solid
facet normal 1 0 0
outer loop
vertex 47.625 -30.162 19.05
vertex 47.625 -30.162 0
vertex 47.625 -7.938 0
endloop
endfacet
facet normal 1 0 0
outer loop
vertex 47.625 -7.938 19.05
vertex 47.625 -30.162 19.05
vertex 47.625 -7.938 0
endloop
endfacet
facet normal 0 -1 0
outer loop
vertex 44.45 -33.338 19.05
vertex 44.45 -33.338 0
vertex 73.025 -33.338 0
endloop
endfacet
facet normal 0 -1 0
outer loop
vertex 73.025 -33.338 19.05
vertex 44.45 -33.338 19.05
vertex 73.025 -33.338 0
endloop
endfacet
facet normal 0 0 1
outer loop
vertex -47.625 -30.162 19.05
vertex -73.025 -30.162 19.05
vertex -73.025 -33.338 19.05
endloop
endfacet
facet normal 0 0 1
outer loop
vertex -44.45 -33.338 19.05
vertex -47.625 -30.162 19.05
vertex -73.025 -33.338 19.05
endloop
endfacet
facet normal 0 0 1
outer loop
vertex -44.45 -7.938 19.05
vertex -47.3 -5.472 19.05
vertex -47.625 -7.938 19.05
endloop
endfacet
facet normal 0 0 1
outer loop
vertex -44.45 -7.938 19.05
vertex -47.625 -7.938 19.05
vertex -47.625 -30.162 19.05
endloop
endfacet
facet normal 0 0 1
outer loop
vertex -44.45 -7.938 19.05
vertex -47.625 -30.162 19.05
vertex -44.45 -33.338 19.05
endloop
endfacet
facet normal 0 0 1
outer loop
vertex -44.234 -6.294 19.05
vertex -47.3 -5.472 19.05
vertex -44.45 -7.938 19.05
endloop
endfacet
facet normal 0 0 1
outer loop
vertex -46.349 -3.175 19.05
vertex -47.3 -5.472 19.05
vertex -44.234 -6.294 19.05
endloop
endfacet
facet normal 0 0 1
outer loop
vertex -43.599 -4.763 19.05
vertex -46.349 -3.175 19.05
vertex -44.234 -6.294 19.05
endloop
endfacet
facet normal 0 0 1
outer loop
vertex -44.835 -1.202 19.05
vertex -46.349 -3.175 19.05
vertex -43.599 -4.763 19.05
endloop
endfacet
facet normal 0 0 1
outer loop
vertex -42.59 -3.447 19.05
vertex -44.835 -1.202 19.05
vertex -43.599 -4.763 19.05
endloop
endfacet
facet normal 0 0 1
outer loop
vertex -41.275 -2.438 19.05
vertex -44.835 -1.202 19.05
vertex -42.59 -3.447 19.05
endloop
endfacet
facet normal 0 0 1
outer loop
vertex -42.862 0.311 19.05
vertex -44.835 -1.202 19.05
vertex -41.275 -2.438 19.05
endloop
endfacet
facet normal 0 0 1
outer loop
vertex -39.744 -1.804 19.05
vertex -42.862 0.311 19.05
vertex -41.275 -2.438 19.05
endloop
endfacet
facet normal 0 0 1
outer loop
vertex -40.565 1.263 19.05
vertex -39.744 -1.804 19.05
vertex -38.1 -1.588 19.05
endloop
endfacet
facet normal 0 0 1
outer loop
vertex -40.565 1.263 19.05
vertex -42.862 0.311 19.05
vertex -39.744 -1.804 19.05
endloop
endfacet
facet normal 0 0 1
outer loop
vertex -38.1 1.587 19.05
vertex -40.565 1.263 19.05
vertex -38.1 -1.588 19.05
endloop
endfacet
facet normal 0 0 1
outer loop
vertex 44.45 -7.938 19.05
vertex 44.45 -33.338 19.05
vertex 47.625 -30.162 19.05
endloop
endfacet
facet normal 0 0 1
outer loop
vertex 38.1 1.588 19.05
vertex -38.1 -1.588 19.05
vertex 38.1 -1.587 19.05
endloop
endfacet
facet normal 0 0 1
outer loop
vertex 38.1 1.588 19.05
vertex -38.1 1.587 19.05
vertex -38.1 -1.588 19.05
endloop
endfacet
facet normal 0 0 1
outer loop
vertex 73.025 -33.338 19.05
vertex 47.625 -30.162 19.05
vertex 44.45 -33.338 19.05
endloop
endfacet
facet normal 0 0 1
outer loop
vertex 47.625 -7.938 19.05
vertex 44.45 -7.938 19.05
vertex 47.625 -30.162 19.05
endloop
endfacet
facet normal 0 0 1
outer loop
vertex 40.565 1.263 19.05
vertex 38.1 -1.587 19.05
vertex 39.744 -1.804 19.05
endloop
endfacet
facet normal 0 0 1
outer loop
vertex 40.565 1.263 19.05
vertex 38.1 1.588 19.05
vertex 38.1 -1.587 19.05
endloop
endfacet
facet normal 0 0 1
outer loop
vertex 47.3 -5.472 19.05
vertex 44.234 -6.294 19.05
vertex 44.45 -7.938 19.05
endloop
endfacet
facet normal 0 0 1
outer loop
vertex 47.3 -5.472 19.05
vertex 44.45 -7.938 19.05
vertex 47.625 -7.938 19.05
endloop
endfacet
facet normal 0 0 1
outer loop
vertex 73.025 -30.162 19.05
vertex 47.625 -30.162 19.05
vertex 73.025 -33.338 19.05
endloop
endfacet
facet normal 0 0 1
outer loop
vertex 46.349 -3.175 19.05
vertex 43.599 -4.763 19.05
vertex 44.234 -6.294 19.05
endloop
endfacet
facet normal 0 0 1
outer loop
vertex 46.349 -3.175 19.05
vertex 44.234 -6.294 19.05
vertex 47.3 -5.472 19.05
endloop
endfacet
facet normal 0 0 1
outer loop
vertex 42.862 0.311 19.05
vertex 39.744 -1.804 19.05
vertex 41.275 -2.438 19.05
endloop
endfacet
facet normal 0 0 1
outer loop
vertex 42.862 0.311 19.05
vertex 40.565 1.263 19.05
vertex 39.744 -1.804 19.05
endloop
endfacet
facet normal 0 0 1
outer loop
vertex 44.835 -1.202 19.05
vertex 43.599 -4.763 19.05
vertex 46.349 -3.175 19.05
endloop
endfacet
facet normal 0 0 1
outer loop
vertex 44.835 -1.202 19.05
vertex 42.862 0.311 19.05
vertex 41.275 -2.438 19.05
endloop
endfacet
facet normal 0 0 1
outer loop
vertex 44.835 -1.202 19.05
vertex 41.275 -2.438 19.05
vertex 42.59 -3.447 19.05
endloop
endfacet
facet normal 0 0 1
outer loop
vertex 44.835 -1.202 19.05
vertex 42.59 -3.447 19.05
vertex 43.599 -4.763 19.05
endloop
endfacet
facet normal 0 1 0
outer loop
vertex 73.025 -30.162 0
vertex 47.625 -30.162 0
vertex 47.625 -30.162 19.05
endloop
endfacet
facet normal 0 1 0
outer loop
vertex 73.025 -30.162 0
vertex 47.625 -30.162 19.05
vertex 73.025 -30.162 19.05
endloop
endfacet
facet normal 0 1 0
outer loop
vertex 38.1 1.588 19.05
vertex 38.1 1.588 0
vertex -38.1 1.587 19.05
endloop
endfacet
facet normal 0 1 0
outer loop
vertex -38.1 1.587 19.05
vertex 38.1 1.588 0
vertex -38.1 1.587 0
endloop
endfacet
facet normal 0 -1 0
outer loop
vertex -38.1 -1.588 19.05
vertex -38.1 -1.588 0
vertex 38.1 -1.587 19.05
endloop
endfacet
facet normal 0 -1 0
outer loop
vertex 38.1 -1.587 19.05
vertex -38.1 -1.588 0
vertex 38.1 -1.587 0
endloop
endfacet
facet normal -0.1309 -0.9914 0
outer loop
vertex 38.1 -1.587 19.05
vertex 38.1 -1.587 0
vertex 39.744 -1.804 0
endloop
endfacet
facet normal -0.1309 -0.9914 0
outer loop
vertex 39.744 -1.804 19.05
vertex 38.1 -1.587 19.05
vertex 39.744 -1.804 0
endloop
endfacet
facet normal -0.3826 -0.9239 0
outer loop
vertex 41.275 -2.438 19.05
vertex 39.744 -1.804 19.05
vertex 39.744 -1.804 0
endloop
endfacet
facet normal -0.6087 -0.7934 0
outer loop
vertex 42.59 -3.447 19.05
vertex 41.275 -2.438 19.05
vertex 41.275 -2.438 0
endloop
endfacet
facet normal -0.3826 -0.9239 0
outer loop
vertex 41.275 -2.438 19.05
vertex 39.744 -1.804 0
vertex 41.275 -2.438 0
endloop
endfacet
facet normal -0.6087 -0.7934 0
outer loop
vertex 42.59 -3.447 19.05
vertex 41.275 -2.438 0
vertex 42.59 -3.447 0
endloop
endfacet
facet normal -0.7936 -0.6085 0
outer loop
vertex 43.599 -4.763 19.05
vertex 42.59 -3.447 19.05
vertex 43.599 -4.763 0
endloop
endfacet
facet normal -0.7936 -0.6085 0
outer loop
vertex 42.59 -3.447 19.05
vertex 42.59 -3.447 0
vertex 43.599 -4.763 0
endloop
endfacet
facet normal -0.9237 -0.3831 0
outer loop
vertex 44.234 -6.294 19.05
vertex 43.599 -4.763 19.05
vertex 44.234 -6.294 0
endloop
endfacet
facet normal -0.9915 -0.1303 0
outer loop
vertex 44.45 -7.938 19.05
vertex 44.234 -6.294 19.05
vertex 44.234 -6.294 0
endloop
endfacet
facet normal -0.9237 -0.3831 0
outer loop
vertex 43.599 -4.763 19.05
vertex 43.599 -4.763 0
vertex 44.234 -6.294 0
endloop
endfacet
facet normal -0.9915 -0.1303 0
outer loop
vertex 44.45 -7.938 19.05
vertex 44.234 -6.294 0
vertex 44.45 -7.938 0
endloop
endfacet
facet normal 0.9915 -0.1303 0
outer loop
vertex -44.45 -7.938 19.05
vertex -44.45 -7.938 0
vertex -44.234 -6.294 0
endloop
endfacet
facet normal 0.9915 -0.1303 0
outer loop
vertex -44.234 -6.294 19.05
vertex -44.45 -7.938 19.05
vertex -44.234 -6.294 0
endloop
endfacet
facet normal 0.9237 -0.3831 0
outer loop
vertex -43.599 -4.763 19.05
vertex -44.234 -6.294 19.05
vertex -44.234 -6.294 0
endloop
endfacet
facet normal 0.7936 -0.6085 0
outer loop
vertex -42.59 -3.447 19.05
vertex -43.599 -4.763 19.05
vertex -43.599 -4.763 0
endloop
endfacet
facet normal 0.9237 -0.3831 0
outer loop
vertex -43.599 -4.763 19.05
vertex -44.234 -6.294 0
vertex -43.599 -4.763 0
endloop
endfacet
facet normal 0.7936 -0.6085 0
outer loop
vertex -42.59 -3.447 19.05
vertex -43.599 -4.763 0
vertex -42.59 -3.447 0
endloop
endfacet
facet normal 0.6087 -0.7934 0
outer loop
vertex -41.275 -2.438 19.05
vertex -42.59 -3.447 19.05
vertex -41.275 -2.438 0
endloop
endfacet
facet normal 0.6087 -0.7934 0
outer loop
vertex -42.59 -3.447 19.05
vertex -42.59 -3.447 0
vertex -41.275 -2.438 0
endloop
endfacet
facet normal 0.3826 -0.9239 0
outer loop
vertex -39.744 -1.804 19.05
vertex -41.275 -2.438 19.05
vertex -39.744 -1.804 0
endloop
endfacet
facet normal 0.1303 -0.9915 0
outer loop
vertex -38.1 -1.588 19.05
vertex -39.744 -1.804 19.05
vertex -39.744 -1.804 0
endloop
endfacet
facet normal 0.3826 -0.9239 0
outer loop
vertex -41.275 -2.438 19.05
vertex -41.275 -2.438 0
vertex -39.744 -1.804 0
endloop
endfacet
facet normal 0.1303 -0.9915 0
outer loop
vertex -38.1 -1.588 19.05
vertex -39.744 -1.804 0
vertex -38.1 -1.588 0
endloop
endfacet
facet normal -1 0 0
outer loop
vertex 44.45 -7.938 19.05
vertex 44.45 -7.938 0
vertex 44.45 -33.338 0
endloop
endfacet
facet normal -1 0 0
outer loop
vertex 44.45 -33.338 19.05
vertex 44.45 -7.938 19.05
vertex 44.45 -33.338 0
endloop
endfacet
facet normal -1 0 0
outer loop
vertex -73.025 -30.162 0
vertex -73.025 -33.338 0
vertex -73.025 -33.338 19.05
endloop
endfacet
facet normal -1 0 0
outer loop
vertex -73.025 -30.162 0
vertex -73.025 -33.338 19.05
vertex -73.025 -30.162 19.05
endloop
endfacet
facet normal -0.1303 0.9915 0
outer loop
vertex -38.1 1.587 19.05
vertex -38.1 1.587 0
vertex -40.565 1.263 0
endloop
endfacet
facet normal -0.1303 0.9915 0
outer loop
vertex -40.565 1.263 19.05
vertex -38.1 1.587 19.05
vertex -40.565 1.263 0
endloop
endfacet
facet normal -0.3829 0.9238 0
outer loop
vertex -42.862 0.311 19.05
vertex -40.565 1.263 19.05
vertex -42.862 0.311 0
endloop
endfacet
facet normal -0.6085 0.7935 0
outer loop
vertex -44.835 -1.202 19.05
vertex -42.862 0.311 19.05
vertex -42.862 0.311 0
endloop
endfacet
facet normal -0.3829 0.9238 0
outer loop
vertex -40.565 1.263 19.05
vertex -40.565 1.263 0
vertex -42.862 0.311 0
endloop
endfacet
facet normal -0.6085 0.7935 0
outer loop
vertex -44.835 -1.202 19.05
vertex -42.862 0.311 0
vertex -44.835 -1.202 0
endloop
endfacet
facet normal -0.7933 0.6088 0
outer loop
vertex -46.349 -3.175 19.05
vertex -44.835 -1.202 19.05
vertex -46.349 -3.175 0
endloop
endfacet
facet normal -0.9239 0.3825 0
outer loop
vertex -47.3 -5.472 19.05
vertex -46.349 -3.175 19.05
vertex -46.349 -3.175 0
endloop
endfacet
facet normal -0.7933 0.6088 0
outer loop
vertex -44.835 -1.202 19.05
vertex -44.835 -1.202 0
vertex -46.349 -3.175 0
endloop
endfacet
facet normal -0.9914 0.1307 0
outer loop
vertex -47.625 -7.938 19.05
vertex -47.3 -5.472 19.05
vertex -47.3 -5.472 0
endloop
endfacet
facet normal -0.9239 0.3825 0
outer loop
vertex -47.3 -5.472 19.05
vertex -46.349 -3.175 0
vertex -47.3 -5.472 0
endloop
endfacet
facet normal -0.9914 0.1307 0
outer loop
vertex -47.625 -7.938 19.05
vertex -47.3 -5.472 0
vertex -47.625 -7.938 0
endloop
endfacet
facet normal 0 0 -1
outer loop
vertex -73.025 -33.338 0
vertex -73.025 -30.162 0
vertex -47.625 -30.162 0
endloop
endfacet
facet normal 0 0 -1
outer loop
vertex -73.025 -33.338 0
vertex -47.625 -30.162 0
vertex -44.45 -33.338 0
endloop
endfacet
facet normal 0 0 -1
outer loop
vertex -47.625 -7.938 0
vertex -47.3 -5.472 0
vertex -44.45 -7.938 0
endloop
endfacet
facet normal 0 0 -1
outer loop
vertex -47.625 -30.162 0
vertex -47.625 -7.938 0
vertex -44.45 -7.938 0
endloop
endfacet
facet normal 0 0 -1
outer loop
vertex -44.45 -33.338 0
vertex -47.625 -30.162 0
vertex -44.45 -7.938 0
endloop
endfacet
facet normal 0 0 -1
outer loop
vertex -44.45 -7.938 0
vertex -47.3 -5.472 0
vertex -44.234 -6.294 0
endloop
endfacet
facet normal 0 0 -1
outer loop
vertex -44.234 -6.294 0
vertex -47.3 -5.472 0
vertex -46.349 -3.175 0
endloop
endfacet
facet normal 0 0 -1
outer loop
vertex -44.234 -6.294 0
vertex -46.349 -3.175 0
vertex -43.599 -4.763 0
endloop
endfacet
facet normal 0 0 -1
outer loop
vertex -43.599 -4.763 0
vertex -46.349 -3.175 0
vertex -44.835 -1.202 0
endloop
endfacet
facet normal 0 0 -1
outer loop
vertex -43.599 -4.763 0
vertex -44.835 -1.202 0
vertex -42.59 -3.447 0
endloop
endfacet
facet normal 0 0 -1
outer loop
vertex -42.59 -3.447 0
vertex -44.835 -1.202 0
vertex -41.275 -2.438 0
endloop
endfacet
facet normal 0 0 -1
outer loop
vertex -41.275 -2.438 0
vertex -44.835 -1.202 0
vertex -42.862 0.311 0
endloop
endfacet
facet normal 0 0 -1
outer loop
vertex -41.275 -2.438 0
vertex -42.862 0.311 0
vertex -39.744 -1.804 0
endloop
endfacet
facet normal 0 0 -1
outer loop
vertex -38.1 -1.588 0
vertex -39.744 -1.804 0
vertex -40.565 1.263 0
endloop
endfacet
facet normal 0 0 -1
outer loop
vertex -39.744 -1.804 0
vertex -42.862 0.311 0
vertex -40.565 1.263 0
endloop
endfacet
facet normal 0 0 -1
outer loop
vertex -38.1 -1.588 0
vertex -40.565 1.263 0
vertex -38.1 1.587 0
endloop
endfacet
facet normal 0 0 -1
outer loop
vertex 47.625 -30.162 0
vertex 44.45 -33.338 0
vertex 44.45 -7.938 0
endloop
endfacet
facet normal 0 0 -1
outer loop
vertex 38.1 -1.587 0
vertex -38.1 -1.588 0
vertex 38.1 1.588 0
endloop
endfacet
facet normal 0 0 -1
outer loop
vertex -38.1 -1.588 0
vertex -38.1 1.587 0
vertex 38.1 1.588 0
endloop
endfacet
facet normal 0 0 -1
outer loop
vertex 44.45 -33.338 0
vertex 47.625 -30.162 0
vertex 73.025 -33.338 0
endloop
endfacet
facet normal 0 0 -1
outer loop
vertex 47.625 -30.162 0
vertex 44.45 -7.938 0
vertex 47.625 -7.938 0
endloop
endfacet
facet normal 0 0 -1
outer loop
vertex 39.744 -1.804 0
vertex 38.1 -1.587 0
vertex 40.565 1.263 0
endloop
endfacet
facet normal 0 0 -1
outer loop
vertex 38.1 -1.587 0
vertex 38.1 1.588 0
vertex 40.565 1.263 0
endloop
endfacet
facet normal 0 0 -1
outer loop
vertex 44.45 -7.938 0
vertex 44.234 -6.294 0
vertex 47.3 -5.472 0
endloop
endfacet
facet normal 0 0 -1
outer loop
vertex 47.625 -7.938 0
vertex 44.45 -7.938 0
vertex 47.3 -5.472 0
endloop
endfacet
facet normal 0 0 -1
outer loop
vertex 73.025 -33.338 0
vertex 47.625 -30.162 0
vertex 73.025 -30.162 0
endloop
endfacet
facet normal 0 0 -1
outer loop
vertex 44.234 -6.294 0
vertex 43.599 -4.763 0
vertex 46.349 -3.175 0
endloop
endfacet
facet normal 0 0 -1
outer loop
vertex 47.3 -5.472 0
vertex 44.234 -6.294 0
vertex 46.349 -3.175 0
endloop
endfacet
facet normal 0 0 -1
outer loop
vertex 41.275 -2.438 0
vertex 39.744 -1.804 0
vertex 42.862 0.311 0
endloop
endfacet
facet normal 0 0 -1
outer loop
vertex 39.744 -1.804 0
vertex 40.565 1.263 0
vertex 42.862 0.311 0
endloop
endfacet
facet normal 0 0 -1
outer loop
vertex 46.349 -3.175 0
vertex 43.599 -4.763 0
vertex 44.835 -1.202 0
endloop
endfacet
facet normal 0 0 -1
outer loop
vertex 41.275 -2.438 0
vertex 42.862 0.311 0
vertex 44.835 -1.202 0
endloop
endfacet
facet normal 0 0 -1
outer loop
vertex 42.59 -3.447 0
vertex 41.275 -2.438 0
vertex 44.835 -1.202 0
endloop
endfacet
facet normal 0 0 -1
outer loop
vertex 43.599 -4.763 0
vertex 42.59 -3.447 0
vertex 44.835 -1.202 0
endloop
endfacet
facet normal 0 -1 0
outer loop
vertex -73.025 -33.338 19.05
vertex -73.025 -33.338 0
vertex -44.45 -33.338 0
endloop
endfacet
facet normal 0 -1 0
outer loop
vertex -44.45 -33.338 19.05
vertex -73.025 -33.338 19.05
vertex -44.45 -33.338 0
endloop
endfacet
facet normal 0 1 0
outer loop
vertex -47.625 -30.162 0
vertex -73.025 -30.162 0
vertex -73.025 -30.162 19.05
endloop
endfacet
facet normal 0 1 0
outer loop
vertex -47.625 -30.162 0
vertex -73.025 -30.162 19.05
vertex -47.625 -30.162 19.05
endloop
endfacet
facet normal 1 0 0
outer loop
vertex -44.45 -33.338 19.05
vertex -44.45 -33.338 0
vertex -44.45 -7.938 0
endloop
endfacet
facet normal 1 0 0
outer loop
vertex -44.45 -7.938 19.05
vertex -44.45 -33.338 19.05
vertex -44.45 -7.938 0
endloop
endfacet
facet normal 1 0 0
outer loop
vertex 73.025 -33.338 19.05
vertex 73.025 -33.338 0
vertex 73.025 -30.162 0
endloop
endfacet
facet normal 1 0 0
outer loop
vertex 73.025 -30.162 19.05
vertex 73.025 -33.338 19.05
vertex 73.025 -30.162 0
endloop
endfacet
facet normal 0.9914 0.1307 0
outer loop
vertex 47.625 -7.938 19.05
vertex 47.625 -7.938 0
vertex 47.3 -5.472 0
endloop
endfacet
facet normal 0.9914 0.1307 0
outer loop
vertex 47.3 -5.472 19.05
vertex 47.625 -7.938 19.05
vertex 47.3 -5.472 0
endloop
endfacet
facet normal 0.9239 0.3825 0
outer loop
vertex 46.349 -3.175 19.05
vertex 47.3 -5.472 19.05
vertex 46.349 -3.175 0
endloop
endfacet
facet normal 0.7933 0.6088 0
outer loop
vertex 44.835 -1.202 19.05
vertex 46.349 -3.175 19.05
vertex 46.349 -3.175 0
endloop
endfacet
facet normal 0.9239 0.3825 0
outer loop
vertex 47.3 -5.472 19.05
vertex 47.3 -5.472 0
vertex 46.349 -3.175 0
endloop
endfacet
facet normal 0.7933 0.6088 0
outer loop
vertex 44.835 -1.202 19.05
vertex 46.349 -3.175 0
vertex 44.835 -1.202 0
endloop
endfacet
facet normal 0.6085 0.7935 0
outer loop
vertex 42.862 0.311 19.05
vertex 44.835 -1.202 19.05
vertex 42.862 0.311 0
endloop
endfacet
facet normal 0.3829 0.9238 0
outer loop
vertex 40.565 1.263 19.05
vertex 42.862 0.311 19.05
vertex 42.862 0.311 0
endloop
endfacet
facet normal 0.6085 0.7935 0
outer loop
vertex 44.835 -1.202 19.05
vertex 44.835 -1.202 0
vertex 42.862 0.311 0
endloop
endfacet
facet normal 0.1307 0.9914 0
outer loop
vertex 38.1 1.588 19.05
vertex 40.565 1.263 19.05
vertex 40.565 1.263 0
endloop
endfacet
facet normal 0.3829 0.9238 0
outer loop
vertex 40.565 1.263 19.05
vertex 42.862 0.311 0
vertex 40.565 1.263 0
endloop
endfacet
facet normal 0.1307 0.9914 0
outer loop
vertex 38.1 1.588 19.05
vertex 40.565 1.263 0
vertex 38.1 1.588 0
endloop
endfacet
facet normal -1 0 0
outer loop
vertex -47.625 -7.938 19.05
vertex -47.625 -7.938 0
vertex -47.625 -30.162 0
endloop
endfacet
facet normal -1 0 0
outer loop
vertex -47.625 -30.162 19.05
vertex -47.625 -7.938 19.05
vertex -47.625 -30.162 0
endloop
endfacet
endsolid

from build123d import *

# Parameters (mm, degrees)
F0_W     = 25.4
F0_H     = 3.175
F1_DEPTH = 19.05


with BuildPart() as f1:
    # F0 (on Top) → F1 (new body)
    with BuildSketch(Plane.XY):
        with BuildLine():
            Line((-38.1, -1.5875), (-38.1, 1.5875))
            ThreePointArc((-38.1, 1.5875), (-44.835192, -1.202308), (-47.625, -7.9375))
            Line((-47.625, -7.9375), (-44.45, -7.9375))
            ThreePointArc((-44.45, -7.9375), (-42.590128, -3.447372), (-38.1, -1.5875))
        make_face()
        with BuildLine():
            Line((-44.45, -7.9375), (-47.625, -7.9375))
            ThreePointArc((-47.625, -7.9375), (-46.795096, -11.826065), (-44.45, -15.037016))
            Line((-44.45, -15.037016), (-44.45, -7.9375))
        make_face()
        with BuildLine():
            ThreePointArc((-44.45, -15.037016), (-46.795096, -11.826065), (-47.625, -7.9375))
            Line((-47.625, -7.9375), (-47.625, -30.1625))
            Line((-47.625, -30.1625), (-47.625, -33.3375))
            Line((-47.625, -33.3375), (-44.45, -33.3375))
            Line((-44.45, -33.3375), (-44.45, -15.037016))
        make_face()
        with Locations((-60.325, -31.75)):
            Rectangle(F0_W, F0_H)
        with BuildLine():
            ThreePointArc((-31.000484, -1.5875), (-34.211435, 0.757596), (-38.1, 1.5875))
            Line((-38.1, 1.5875), (-38.1, -1.5875))
            Line((-38.1, -1.5875), (-31.000484, -1.5875))
        make_face()
        with BuildLine():
            Line((0, 1.5875), (-38.1, 1.5875))
            ThreePointArc((-38.1, 1.5875), (-34.211435, 0.757596), (-31.000484, -1.5875))
            Line((-31.000484, -1.5875), (0, -1.5875))
            Line((0, -1.5875), (0, 1.5875))
        make_face()
        with BuildLine():
            Line((38.1, 1.5875), (0, 1.5875))
            Line((0, 1.5875), (0, -1.5875))
            Line((0, -1.5875), (31.000484, -1.5875))
            ThreePointArc((31.000484, -1.5875), (34.211435, 0.757596), (38.1, 1.5875))
        make_face()
        with BuildLine():
            Line((38.1, -1.5875), (38.1, 1.5875))
            ThreePointArc((38.1, 1.5875), (34.211435, 0.757596), (31.000484, -1.5875))
            Line((31.000484, -1.5875), (38.1, -1.5875))
        make_face()
        with BuildLine():
            ThreePointArc((47.625, -7.9375), (44.835192, -1.202308), (38.1, 1.5875))
            Line((38.1, 1.5875), (38.1, -1.5875))
            ThreePointArc((38.1, -1.5875), (42.590128, -3.447372), (44.45, -7.9375))
            Line((44.45, -7.9375), (47.625, -7.9375))
        make_face()
        with BuildLine():
            ThreePointArc((44.45, -15.037016), (46.795096, -11.826065), (47.625, -7.9375))
            Line((47.625, -7.9375), (44.45, -7.9375))
            Line((44.45, -7.9375), (44.45, -15.037016))
        make_face()
        with BuildLine():
            Line((47.625, -30.1625), (47.625, -7.9375))
            ThreePointArc((47.625, -7.9375), (46.795096, -11.826065), (44.45, -15.037016))
            Line((44.45, -15.037016), (44.45, -33.3375))
            Line((44.45, -33.3375), (47.625, -33.3375))
            Line((47.625, -33.3375), (47.625, -30.1625))
        make_face()
        with Locations((60.325, -31.75)):
            Rectangle(F0_W, F0_H)
    extrude(amount=F1_DEPTH)


solid = f1.part
